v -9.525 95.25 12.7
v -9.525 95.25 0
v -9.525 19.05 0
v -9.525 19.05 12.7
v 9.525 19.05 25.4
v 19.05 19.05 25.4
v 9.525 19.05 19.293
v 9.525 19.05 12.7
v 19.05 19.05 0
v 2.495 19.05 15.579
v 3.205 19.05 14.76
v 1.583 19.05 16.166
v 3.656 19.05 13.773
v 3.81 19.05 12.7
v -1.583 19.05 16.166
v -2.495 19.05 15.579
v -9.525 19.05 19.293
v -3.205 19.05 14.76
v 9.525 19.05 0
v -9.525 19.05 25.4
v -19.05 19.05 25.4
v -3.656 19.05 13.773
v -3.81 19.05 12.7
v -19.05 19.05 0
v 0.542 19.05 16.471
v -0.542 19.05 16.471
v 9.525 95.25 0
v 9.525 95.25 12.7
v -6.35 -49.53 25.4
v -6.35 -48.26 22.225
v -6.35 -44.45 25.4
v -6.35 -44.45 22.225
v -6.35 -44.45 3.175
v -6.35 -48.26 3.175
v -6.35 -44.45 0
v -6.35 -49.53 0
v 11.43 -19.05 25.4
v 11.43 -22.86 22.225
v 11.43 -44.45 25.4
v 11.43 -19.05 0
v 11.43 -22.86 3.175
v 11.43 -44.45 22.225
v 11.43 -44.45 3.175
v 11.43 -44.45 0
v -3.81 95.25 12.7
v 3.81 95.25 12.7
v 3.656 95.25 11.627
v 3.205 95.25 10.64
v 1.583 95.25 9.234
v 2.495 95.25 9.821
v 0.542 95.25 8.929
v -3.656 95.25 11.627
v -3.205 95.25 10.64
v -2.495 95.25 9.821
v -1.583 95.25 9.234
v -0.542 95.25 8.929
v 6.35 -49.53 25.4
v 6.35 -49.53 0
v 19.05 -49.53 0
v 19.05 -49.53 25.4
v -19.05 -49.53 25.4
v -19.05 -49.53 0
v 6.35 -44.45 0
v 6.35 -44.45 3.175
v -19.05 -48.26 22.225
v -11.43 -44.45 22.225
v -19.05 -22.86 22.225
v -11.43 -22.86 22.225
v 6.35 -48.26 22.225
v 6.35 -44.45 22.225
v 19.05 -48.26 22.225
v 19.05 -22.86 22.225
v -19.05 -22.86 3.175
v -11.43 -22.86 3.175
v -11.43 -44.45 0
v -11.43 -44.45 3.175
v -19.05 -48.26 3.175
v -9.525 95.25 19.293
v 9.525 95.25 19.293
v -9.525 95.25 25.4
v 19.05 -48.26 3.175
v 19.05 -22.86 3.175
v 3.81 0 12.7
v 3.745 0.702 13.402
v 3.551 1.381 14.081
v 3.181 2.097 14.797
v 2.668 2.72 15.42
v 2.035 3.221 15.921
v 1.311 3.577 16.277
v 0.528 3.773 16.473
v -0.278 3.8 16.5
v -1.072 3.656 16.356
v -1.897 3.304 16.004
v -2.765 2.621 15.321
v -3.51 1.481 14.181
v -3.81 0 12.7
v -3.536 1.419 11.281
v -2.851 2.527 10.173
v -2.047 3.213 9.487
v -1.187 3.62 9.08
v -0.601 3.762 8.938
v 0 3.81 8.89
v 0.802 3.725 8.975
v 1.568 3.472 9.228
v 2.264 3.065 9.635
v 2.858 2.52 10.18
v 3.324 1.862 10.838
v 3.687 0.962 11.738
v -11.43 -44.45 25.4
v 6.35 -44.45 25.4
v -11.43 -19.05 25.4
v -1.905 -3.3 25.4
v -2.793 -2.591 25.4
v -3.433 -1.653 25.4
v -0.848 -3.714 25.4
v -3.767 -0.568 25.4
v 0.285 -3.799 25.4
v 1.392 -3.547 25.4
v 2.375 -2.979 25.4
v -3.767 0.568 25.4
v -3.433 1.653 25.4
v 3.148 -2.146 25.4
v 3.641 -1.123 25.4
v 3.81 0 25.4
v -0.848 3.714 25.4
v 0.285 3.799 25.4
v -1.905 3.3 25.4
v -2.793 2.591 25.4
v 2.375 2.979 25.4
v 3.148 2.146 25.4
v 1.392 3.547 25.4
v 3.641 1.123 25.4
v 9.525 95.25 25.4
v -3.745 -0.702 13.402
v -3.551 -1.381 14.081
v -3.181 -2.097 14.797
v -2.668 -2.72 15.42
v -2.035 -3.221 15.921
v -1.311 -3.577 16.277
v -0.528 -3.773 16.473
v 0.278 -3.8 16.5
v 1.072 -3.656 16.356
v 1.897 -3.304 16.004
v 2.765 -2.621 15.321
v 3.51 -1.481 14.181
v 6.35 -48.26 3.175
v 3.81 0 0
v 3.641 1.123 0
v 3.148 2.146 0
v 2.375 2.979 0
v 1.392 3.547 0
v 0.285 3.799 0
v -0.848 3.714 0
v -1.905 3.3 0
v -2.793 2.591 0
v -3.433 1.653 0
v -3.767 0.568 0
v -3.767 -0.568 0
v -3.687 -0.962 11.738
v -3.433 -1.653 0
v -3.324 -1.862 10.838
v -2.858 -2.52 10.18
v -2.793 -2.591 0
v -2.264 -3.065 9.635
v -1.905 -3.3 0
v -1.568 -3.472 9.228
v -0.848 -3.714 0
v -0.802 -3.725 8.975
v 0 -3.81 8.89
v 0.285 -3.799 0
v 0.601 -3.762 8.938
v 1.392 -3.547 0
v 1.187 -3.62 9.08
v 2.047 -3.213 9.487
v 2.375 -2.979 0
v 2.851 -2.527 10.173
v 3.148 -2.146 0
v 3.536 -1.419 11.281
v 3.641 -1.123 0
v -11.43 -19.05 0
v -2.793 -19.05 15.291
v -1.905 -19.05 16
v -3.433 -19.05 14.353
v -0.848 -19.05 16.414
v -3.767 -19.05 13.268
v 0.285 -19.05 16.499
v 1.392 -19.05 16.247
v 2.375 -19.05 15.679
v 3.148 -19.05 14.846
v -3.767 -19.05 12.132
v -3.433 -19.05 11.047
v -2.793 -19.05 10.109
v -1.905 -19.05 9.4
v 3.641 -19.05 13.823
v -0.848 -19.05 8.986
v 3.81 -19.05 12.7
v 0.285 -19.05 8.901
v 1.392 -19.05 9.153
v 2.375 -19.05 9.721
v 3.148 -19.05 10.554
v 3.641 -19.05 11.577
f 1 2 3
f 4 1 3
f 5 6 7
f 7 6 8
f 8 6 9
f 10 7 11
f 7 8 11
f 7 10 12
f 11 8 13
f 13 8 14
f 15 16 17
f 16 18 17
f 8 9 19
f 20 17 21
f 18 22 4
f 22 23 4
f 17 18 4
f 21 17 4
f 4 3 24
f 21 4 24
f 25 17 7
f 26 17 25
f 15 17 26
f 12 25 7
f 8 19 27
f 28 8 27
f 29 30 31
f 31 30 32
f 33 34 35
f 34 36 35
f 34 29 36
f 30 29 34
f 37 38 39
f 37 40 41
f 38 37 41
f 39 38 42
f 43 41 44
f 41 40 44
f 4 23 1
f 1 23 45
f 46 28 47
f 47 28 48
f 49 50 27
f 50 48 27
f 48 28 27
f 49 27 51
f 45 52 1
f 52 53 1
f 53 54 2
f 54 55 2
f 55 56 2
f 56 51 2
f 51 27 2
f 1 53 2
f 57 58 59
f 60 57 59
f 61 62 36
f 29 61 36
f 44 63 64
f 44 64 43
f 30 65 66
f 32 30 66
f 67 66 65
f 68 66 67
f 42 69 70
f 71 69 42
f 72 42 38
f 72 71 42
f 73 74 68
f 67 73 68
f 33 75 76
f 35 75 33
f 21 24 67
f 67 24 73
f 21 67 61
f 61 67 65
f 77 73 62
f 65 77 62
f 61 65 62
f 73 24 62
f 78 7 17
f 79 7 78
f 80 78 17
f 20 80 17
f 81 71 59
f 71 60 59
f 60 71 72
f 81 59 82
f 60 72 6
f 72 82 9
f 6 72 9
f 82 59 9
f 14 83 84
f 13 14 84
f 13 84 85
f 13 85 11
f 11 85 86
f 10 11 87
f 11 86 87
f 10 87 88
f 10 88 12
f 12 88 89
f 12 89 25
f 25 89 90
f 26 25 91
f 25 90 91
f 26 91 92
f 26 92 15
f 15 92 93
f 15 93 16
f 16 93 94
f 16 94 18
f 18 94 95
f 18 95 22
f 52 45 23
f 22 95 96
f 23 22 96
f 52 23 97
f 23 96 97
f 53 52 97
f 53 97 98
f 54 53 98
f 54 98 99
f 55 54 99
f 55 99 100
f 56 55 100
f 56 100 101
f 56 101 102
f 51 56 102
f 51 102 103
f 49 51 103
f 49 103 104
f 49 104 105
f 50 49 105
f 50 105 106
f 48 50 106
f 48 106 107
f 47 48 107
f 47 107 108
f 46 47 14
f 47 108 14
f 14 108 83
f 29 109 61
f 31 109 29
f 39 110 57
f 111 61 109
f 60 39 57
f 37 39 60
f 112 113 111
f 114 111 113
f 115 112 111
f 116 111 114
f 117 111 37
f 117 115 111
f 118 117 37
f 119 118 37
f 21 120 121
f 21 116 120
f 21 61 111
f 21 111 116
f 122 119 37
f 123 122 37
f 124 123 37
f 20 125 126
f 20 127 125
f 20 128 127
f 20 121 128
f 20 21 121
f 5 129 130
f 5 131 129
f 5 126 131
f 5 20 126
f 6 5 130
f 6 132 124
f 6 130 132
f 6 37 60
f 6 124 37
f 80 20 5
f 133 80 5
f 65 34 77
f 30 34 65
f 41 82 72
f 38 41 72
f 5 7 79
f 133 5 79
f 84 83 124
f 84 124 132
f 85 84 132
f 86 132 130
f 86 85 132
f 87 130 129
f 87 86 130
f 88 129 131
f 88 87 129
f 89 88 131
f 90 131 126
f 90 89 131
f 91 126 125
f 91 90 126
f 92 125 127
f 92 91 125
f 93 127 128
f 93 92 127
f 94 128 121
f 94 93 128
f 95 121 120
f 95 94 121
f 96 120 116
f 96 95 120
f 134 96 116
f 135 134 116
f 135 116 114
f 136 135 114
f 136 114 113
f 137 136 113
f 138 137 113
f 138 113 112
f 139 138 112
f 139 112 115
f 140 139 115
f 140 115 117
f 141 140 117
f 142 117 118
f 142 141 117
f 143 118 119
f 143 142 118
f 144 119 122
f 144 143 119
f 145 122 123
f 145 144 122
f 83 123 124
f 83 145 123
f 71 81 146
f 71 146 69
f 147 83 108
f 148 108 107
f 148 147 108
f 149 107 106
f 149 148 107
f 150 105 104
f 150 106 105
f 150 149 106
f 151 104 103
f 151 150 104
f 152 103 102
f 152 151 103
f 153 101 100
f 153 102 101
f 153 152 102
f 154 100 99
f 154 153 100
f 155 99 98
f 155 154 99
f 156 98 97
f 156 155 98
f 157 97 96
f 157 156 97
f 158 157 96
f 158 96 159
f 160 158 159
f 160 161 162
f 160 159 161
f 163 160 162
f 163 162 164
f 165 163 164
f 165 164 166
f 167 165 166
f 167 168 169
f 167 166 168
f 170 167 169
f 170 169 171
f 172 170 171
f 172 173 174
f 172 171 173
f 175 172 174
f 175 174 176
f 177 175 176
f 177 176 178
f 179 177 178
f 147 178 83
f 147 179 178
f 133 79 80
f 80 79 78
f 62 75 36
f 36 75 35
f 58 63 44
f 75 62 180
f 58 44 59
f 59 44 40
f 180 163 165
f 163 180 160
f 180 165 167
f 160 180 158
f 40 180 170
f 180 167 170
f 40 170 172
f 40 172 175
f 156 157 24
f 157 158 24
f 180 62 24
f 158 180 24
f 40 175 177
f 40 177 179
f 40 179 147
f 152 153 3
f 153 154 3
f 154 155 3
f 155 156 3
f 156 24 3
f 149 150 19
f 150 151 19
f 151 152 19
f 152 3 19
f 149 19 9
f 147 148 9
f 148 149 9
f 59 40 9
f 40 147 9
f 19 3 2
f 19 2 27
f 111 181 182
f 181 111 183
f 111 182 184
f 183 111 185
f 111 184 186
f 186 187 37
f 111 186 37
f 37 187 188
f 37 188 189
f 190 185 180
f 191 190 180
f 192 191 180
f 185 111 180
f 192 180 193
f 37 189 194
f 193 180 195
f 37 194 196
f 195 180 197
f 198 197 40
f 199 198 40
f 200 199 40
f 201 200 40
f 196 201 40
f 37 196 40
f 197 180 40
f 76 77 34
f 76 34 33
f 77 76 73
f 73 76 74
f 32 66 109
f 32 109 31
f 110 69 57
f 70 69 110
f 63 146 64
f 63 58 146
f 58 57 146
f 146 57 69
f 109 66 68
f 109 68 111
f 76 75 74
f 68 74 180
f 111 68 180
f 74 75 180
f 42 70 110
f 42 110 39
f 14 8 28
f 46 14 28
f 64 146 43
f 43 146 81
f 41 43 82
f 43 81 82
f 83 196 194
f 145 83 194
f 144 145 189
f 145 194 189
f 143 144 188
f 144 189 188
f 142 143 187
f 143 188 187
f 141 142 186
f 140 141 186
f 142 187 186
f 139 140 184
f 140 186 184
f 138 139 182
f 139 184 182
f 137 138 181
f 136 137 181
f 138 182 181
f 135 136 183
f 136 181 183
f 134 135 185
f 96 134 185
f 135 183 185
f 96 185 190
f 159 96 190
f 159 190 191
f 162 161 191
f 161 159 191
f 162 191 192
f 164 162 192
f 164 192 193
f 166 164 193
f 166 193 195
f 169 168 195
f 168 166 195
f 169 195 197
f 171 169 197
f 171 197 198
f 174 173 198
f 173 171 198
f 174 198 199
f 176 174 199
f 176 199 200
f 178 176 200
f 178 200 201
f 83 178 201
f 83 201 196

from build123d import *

# Parameters (mm, degrees)
F0_R     = 3.81
F0_W     = 7.62
F0_H     = 25.4
F0_H_2   = 5.08
F0_W_2   = 5.08
F1_DEPTH = 25.4
F2_R     = 3.81
F3_DEPTH = 114.301
F4_W     = 25.4
F4_H     = 19.05
F5_DEPTH = 38.101
F6_W     = 76.2
F6_H     = 6.593191
F7_DEPTH = 28.576


with BuildPart() as f1:
    # F0 (on Top) → F1 (new body)
    with BuildSketch(Plane.XY):
        Polygon((-9.525, 19.05), (-19.05, 19.05), (-19.05, -19.05), (-11.43, -19.05), (11.43, -19.05), (19.05, -19.05), (19.05, 19.05), (9.525, 19.05), (0, 19.05), align=None)
        Circle(F0_R, mode=Mode.SUBTRACT)
        Polygon((-9.525, 95.25), (-9.525, 19.05), (0, 19.05), (9.525, 19.05), (9.525, 95.25), align=None)
        with Locations((-15.24, -31.75)):
            Rectangle(F0_W, F0_H)
        with Locations((-15.24, -46.99)):
            Rectangle(F0_W, F0_H_2)
        with Locations((15.24, -31.75)):
            Rectangle(F0_W, F0_H)
        with Locations((-8.89, -46.99)):
            Rectangle(F0_W_2, F0_H_2)
        with Locations((15.24, -46.99)):
            Rectangle(F0_W, F0_H_2)
        with Locations((8.89, -46.99)):
            Rectangle(F0_W_2, F0_H_2)
    extrude(amount=F1_DEPTH)

    # F2 (on face) → F3 (cut, through all)
    with BuildSketch(Plane.XZ.offset(19.05)):
        with Locations((0, 12.7)):
            Circle(F2_R)
    extrude(amount=-F3_DEPTH, mode=Mode.SUBTRACT)

    # F4 (on face) → F5 (cut, through all)
    with BuildSketch(Plane.YZ.offset(19.05)):
        with Locations((-35.56, 12.7)):
            Rectangle(F4_W, F4_H)
    extrude(amount=-F5_DEPTH, mode=Mode.SUBTRACT)

    # F6 (on face) → F7 (cut, through all)
    with BuildSketch(Plane.YZ.offset(9.525)):
        with Locations((57.15, 15.996595)):
            Rectangle(F6_W, F6_H)
    extrude(amount=-F7_DEPTH, mode=Mode.SUBTRACT)


solid = f1.part
